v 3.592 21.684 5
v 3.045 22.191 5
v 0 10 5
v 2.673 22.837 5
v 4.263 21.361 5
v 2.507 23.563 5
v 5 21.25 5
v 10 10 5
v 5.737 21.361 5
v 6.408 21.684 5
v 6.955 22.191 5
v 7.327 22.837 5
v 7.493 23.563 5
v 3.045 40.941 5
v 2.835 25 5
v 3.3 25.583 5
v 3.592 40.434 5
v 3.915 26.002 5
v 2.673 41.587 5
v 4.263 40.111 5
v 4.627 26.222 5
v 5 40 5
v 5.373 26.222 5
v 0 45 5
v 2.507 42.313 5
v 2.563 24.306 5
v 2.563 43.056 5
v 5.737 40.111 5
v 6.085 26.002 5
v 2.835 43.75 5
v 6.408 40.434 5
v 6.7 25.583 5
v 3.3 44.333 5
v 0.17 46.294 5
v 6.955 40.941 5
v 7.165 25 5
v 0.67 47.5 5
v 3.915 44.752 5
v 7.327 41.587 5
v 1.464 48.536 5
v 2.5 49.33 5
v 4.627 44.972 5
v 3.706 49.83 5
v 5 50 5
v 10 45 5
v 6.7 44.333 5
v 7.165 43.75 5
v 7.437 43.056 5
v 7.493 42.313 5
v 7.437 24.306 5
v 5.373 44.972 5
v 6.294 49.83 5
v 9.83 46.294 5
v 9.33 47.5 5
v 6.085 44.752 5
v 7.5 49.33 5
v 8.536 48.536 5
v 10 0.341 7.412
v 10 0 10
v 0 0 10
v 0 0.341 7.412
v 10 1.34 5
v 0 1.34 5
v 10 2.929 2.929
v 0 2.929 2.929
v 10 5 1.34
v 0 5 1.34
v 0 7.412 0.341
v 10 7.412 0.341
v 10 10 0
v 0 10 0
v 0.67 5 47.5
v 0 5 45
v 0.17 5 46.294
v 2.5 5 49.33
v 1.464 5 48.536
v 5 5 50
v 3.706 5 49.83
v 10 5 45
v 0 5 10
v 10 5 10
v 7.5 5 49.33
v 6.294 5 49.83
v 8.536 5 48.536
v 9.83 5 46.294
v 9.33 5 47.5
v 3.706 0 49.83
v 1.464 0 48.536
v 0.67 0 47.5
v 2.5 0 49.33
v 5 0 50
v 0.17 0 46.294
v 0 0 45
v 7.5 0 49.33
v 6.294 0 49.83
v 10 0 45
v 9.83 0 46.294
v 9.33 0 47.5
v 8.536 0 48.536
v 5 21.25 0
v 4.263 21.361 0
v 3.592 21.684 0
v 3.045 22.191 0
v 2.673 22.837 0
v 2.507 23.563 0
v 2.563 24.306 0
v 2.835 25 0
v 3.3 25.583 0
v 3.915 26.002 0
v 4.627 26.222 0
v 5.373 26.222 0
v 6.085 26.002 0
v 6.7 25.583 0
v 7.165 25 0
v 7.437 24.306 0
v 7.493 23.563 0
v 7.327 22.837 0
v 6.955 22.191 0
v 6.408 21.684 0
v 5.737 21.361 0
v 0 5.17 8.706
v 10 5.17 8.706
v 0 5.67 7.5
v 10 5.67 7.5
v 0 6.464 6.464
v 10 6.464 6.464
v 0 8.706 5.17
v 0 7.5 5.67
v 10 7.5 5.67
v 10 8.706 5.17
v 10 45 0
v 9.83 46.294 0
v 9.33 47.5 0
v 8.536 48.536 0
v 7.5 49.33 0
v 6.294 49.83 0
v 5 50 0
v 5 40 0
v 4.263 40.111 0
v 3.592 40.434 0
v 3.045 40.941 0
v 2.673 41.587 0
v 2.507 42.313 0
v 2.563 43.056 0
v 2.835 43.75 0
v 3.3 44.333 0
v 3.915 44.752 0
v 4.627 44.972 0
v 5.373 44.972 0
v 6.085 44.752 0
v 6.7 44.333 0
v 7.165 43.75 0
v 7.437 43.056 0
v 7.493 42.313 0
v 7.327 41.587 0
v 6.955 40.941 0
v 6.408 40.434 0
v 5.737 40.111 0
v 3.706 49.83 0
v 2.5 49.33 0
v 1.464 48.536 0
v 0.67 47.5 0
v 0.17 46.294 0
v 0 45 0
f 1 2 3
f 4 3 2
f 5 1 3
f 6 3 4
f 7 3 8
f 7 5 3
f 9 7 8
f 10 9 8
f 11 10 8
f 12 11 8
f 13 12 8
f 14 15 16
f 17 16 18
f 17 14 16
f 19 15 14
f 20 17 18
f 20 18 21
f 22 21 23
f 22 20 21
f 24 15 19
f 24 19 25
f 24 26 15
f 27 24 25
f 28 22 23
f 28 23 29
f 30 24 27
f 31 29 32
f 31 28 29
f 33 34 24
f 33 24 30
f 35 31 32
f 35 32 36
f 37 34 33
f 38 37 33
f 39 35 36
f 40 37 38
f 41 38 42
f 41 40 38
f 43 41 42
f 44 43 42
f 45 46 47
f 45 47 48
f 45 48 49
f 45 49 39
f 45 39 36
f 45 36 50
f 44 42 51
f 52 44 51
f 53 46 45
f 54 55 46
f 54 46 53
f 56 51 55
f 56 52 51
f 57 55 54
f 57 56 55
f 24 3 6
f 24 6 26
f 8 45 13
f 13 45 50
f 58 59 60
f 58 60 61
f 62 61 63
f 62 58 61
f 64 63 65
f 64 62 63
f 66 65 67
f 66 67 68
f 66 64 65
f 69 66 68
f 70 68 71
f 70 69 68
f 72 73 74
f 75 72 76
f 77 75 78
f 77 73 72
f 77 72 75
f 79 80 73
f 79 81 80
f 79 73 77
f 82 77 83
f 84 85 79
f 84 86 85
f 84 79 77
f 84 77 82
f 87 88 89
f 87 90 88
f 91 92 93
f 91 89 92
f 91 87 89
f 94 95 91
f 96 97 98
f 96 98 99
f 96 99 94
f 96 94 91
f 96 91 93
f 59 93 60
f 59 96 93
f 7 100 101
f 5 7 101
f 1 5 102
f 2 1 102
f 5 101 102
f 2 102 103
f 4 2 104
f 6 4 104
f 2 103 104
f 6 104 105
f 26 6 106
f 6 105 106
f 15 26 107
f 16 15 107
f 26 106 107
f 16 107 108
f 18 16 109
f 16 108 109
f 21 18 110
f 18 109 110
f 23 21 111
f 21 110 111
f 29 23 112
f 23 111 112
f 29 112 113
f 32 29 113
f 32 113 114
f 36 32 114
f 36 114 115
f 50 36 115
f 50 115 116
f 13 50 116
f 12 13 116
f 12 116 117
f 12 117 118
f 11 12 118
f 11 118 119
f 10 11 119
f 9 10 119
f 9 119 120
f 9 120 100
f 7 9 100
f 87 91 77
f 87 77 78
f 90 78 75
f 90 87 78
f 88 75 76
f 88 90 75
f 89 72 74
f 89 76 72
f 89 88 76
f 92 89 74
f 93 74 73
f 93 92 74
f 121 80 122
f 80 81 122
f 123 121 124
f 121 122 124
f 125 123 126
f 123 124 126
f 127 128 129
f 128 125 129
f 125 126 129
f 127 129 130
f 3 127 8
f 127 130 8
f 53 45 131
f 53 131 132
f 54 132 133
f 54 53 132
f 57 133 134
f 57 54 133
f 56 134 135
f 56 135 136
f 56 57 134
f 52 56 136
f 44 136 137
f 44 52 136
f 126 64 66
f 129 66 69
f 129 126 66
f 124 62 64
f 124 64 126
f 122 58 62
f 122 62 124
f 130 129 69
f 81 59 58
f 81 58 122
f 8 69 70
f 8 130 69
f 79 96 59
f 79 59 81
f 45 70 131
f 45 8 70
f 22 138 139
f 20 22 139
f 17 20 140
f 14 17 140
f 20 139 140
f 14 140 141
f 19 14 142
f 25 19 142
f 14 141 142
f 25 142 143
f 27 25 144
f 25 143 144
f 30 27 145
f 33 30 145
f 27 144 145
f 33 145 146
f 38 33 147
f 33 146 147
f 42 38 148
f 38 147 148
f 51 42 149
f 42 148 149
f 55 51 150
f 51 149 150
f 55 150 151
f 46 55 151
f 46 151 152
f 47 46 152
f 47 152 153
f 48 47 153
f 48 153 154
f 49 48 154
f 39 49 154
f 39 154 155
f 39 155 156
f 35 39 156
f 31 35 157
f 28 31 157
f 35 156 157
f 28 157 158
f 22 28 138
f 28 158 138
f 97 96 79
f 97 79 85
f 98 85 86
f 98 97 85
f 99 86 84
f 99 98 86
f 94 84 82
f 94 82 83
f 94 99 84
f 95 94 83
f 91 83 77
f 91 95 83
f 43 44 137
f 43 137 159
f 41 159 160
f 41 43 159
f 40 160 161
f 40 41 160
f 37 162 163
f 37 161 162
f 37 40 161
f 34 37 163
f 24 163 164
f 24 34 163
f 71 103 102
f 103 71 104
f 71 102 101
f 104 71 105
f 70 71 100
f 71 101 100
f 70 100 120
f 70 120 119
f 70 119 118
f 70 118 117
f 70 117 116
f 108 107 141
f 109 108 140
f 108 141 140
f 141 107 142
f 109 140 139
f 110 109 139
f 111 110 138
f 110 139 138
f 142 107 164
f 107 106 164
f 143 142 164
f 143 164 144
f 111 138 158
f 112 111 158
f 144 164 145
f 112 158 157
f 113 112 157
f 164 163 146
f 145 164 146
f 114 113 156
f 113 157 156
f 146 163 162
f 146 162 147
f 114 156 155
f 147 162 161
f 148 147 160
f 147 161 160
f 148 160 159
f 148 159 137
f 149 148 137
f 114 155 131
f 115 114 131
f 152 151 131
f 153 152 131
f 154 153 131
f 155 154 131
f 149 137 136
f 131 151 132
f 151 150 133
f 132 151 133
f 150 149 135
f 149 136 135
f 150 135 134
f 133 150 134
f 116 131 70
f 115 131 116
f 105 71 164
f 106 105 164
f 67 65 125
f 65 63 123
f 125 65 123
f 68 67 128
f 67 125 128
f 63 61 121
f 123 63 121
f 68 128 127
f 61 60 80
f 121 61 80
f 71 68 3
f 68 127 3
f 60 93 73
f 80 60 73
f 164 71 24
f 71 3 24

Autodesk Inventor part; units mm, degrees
ref_plane "YZ Plane" through (0, 0, 0) normal (1, 0, 0) x (0, 1, 0)
ref_plane "XZ Plane" through (0, 0, 0) normal (0, 1, 0) x (-1, 0, 0)
ref_plane "XY Plane" through (0, 0, 0) normal (0, 0, 1) x (1, 0, 0)
sketch "Szkic1" plane through (0, 0, 0) normal (0, 0, 1) x (1, 0, 0)
  line L0 (0, 0) -> (10, 0)
  line L1 (10, 0) -> (10, 50)
  line L2 (10, 50) -> (0, 50)
  line L3 (0, 50) -> (0, 0)
  dimension "d0" = 50
  dimension "d1" = 10
extrude "Płyta1" add sketch "Szkic1" along normal blind 5
sketch "Szkic3" plane through (10, 5, 0) normal (0, -1, 0) x (1, 0, 0)
  line L0 (-10, 0) -> (0, 0)
  line L1 (0, 0) -> (0, 50)
  line L2 (0, 50) -> (-10, 50)
  line L3 (-10, 50) -> (-10, 0)
edge flange "Kołnierz1" height 50 angle 90 thickness 5 bend radius 5 thickness toward (0, -1, 0) relief tear relief width 5 relief depth 2.5 edges at (5, 0, 5) wall of the first edge with corners at (0, 5, 0) (10, 5, 0) (10, 5, 50) (0, 5, 50)
bend "Gięcie1"
corner "Narożnik1"
sketch "Szkic2" plane through (0, 0, 5) normal (0, 0, 1) x (1, 0, 0)
  line L0 (0, 0) -> (0, 50) construction
  line L1 (10, 50) -> (10, 0) construction
  arc A0 (10, 45) -> (0, 45) centre (5, 45) ccw
  line L2 (5, 23.75) -> (5.65, 23.75) construction
  point P0 (5, 42.5)
  point P1 (5, 5)
  point P2 (0, 5)
  point P3 (10, 5)
  dimension "d5" = 5
  dimension "d6" = 5
  dimension "d7" = 2.5
hole "Otwór4" at (5, 42.5, 5) at (5, 23.75, 5) direction (0, 0, -1) diameter 5 end through all
fillet "Zaokrąglenie2" radius 5 4 edges at (0, 2.5, 50) (10, 2.5, 50) (10, 50, 2.5) (0, 50, 2.5)
equation "\"d45\" = Grubość"
equation "\"d23\" = SzerokośćGięciaPodcięcia"
equation "\"d24\" = GłębokośćGięciaPodcięcia"
equation "\"d25\" = MinimalnaPozostałość"
equation "\"d26\" = PromieńGięcia"
equation "\"d29\" = PromieńGięcia"
equation "\"d30\" = RozmiarPodcięciaNarożnika"
equation "\"d31\" = Wielk_odstępu"
equation "\"d32\" = Rozmiar_promienia_Jacobiego"
equation "\"PromieńGięcia\" = Grubość"
equation "\"SzerokośćGięciaPodcięcia\" = Grubość"
equation "\"GłębokośćGięciaPodcięcia\" = 0.5 * Grubość"
equation "\"PromieńPrzejścia\" = PromieńGięcia"
equation "\"Rozmiar_promienia_Jacobiego\" = PromieńGięcia"
equation "\"Wielk_odstępu\" = Grubość"
equation "\"d2\" = PromieńGięcia"
equation "\"Grubość\" = 5"
equation "\"MinimalnaPozostałość\" = 10"
equation "\"RozmiarPodcięciaNarożnika\" = 20"
properties part number "Pręt_łączący" material "Stal nierdzewna"
